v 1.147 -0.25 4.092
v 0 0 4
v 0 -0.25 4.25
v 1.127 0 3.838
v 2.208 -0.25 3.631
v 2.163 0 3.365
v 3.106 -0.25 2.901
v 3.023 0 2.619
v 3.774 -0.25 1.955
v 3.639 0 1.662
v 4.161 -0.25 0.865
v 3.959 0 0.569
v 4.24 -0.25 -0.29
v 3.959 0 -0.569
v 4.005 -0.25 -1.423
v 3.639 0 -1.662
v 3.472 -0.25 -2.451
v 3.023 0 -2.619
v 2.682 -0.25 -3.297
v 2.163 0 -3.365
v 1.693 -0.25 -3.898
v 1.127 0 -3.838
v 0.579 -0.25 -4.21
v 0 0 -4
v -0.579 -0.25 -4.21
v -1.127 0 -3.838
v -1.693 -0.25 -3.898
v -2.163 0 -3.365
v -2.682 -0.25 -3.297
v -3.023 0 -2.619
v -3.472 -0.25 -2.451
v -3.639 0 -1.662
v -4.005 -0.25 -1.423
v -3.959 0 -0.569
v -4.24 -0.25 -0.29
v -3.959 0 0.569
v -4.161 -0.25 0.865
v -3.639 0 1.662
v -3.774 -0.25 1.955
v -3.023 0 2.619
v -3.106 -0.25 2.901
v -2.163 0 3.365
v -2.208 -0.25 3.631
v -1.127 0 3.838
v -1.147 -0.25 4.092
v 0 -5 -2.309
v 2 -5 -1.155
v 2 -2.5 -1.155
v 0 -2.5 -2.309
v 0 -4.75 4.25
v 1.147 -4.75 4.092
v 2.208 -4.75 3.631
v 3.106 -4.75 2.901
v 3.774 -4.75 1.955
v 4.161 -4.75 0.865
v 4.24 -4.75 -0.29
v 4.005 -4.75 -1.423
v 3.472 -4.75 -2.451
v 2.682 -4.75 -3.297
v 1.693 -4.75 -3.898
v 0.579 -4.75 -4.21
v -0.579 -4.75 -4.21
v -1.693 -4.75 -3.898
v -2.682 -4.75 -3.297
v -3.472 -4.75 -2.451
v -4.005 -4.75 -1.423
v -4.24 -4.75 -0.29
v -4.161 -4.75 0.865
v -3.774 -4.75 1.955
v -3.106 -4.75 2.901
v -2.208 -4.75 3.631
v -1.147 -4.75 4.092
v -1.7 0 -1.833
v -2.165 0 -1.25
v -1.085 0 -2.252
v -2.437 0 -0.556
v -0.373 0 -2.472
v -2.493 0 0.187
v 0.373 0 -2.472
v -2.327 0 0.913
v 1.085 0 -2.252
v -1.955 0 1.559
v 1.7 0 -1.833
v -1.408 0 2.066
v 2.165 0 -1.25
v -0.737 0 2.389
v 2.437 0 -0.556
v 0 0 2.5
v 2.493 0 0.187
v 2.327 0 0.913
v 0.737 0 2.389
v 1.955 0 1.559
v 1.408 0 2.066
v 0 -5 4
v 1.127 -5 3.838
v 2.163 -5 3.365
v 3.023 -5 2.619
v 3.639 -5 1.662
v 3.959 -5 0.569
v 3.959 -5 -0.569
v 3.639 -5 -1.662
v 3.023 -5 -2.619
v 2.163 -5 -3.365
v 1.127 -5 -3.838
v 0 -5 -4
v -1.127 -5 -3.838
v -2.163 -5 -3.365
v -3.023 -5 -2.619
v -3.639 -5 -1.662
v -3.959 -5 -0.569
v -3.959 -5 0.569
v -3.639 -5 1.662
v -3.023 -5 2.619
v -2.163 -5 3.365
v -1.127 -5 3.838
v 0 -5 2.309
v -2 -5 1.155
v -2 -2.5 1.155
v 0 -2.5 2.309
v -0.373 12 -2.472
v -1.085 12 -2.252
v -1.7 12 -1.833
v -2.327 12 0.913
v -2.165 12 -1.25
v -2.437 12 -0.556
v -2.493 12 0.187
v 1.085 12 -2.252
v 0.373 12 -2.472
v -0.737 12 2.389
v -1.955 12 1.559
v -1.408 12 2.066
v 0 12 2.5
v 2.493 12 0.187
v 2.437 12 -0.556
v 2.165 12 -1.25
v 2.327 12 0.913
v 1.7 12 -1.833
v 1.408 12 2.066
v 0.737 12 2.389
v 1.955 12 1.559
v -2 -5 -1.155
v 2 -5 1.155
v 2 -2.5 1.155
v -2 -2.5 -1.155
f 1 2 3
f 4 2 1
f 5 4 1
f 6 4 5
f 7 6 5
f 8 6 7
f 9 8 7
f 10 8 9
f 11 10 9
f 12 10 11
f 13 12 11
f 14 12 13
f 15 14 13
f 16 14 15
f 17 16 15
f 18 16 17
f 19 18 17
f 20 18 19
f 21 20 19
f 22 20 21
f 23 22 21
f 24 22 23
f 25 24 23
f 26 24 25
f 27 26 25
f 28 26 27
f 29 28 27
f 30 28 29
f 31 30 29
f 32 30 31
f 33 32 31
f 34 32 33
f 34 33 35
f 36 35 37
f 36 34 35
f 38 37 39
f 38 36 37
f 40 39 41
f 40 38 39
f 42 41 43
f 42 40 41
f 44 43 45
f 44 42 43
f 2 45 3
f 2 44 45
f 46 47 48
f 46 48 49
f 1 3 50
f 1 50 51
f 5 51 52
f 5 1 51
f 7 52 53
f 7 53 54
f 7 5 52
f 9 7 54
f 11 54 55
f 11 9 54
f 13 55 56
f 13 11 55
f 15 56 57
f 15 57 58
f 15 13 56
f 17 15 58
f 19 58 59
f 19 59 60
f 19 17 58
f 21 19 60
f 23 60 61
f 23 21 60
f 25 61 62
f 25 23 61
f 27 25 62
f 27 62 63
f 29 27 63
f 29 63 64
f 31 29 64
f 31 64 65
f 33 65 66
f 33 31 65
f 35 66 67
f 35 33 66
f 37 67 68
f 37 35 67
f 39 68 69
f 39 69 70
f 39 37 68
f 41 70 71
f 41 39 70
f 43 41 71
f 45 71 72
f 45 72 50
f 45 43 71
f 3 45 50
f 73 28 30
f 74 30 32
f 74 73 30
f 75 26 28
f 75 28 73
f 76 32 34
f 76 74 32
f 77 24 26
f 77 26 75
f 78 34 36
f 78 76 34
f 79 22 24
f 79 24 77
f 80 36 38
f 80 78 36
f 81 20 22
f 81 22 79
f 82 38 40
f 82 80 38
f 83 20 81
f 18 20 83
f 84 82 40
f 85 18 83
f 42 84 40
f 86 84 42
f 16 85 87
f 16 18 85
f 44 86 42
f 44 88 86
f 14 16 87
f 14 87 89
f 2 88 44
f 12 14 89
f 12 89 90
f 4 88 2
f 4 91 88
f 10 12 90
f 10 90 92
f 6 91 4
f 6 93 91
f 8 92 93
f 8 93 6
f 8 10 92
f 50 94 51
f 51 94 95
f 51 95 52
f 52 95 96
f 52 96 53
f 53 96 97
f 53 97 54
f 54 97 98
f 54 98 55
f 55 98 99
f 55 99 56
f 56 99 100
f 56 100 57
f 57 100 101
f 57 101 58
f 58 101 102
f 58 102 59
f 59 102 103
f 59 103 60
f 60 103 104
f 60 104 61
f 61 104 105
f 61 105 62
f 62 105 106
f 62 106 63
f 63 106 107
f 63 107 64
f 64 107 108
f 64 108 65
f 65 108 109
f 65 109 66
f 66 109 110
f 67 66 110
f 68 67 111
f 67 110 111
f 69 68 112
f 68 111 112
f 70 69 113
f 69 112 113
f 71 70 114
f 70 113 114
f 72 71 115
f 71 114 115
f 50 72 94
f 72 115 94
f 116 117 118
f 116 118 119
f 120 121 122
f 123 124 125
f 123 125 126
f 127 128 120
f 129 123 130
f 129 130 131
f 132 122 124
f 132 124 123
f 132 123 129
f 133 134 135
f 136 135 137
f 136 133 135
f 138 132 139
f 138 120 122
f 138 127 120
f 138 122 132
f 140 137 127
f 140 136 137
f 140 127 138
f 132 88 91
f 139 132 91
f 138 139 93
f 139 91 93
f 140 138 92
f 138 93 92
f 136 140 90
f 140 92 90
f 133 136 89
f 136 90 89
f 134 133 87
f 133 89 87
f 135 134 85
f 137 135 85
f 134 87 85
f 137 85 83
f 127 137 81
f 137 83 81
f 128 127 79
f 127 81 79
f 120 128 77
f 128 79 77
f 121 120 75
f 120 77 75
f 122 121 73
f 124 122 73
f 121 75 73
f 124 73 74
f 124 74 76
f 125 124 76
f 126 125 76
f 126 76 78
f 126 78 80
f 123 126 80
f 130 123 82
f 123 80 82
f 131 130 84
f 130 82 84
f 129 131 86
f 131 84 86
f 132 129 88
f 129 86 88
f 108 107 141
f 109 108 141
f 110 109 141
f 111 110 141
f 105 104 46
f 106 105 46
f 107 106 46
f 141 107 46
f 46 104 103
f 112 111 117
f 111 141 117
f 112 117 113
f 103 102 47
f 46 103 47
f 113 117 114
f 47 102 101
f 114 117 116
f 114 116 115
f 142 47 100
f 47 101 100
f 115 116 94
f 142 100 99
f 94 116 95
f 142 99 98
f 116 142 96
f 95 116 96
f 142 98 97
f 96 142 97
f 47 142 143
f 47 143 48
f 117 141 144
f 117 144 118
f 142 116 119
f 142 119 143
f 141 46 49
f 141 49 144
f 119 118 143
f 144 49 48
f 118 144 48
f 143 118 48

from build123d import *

# Parameters (mm, degrees)
SKETCH_1_R          = 4.25
EXTRUDE_1_DEPTH     = 5
SKETCH_2_R          = 2.5
EXTRUDE_2_DEPTH     = 12
CUT_EXTRUDE_START   = -5
CUT_EXTRUDE_1_DEPTH = 2.5
CHAMFER_1_SIZE      = 0.25


with BuildPart() as part:
    # 草图1 → 凸台-拉伸1 (new body)
    with BuildSketch(Plane(origin=(0, 0, 0), x_dir=(1, 0, 0), z_dir=(0, 1, 0))):
        with Locations(Location((0, 0, 0), (0, 0, 270))):
            Circle(SKETCH_1_R)
    extrude(amount=-EXTRUDE_1_DEPTH)

    # 草图2 → 凸台-拉伸2 (add)
    with BuildSketch(Plane(origin=(0, 0, 0), x_dir=(1, 0, 0), z_dir=(0, 1, 0))):
        with Locations(Location((0, 0, 0), (0, 0, 270))):
            Circle(SKETCH_2_R)
    extrude(amount=EXTRUDE_2_DEPTH)

    # 草图3 → 切除-拉伸1 (cut)
    with BuildSketch(Plane(origin=(0, 0, 0), x_dir=(1, 0, 0), z_dir=(0, 1, 0)).offset(CUT_EXTRUDE_START)):
        Polygon((2, -1.154700538), (2, 1.154700538), (0, 2.309401077), (-2, 1.154700538), (-2, -1.154700538), (0, -2.309401077), align=None)
    extrude(amount=CUT_EXTRUDE_1_DEPTH, mode=Mode.SUBTRACT)

    # 倒角1
    chamfer_1_edges = [part.edges().sort_by_distance(p)[0] for p in [
        (0, 0, -4.25),
        (0, -5, -4.25),
    ]]
    chamfer(chamfer_1_edges, length=CHAMFER_1_SIZE)


solid = part.part
